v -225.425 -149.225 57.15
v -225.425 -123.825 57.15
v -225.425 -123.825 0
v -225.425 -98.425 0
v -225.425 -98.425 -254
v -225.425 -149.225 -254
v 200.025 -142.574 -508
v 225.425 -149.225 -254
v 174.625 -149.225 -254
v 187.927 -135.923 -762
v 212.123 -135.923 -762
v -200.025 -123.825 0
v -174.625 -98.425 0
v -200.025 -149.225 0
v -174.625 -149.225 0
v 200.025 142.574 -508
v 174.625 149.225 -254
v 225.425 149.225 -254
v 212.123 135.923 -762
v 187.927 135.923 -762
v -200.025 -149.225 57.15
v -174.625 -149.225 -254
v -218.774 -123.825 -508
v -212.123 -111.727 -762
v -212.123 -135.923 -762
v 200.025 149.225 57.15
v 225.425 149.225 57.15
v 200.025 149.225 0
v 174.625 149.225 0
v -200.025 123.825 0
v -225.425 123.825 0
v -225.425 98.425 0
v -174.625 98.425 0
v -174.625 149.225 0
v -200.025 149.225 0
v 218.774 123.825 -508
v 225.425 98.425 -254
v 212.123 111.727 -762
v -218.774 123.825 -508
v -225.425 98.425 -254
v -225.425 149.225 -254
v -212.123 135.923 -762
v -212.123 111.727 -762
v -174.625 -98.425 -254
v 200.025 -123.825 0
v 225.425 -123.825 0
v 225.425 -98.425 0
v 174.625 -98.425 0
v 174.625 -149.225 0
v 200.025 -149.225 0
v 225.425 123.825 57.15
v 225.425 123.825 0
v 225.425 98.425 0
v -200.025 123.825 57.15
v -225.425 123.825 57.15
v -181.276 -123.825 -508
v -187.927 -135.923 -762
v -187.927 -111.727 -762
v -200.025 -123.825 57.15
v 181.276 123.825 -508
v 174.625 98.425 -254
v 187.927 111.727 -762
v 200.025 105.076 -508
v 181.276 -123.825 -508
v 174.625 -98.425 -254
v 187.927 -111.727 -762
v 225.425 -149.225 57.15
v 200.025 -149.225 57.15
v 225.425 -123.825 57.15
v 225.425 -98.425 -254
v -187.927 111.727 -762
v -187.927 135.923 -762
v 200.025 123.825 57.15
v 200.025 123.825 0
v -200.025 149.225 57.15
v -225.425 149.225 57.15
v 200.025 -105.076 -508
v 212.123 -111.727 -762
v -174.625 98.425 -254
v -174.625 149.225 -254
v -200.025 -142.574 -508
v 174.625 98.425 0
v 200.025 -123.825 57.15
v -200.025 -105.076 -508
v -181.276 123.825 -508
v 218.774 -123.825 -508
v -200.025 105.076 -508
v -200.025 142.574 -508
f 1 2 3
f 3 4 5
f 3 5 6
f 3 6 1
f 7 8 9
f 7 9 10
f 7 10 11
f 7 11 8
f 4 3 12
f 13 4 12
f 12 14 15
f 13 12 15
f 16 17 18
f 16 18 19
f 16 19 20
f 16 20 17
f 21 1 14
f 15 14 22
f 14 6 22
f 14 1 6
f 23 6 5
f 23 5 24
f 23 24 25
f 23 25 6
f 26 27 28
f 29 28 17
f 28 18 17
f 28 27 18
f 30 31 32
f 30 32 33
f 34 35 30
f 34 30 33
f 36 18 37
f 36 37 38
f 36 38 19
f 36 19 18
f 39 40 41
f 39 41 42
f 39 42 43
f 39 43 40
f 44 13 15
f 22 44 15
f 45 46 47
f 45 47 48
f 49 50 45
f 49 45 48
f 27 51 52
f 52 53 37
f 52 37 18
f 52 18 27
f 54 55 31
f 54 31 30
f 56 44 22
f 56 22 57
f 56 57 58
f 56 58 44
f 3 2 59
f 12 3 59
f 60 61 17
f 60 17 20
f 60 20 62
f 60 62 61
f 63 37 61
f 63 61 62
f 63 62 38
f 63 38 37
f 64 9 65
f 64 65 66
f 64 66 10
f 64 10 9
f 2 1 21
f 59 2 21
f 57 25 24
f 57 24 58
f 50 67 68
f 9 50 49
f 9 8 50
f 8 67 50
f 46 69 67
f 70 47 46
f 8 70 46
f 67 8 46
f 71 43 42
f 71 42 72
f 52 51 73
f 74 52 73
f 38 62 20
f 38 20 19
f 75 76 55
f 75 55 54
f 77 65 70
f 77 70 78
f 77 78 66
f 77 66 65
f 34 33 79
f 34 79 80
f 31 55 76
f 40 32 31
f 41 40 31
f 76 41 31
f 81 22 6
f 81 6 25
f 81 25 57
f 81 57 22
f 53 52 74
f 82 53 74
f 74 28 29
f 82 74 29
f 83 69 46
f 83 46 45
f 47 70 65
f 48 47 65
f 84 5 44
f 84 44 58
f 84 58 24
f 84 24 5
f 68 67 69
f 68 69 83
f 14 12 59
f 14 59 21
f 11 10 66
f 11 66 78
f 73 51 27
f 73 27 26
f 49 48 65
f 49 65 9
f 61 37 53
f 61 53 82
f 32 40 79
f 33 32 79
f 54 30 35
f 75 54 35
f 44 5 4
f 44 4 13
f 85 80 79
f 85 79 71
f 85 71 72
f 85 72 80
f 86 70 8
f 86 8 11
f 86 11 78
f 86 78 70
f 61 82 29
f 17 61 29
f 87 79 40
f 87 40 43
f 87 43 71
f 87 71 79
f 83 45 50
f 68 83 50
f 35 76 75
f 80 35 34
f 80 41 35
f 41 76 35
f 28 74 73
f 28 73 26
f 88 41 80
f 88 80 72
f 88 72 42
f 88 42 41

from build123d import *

# Parameters (mm, degrees)
F1_W      = 25.4
F1_H      = 25.4
F2_DEPTH  = 254
F3_DEPTH  = 57.15
F2_FACE_W = 50.8
F2_FACE_H = 50.8
F6_DEPTH  = 508
F6_TAPER  = 1.5
F4_FACE_W = 50.8
F4_FACE_H = 50.8
F5_FACE_W = 50.8
F5_FACE_H = 50.8


with BuildPart() as f2:
    # F1 (on Top) → F2 (new body)
    with BuildSketch(Plane.XY):
        Polygon((-174.625, 149.225), (-200.025, 149.225), (-200.025, 123.825), (-225.425, 123.825), (-225.425, 98.425), (-174.625, 98.425), align=None)
        with Locations((-212.725, 136.525)):
            Rectangle(F1_W, F1_H)
    extrude(amount=-F2_DEPTH)

    # F1 (on Top) → F3 (join)
    with BuildSketch(Plane.XY):
        with Locations((-212.725, 136.525)):
            Rectangle(F1_W, F1_H)
    extrude(amount=F3_DEPTH)


with BuildPart() as f4_1:
    # F4: instance of F2
    add(f2.part.mirror(Plane.YZ))


with BuildPart() as f5_1:
    # F5: instance of F2
    add(f2.part.mirror(Plane.XZ))

    # F5_face (on face) → F6, piece 4 (join)
    with BuildSketch(Plane(origin=(200.025, -123.825, -254), x_dir=(1, 0, 0), z_dir=(0, 0, -1))):
        with Locations((-400.05, 0)):
            Rectangle(F5_FACE_W, F5_FACE_H)
    extrude(amount=F6_DEPTH, taper=F6_TAPER)


with BuildPart() as f5_2:
    # F5: instance of F4_1
    add(f4_1.part.mirror(Plane.XZ))

    # F5_face (on face) → F6, piece 3 (join)
    with BuildSketch(Plane(origin=(200.025, -123.825, -254), x_dir=(1, 0, 0), z_dir=(0, 0, -1))):
        Rectangle(F5_FACE_W, F5_FACE_H)
    extrude(amount=F6_DEPTH, taper=F6_TAPER)


with BuildPart() as f2_1:
    add(f2.part)

    # F2_face (on face) → F6 (join)
    with BuildSketch(Plane(origin=(-200.025, 123.825, -254), x_dir=(1, 0, 0), z_dir=(0, 0, -1))):
        Rectangle(F2_FACE_W, F2_FACE_H)
    extrude(amount=F6_DEPTH, taper=F6_TAPER)


with BuildPart() as f4_1_1:
    add(f4_1.part)

    # F4_face (on face) → F6, piece 2 (join)
    with BuildSketch(Plane(origin=(200.025, 123.825, -254), x_dir=(1, 0, 0), z_dir=(0, 0, -1))):
        Rectangle(F4_FACE_W, F4_FACE_H)
    extrude(amount=F6_DEPTH, taper=F6_TAPER)


solid = Compound([f5_1.part, f5_2.part, f2_1.part, f4_1_1.part])
